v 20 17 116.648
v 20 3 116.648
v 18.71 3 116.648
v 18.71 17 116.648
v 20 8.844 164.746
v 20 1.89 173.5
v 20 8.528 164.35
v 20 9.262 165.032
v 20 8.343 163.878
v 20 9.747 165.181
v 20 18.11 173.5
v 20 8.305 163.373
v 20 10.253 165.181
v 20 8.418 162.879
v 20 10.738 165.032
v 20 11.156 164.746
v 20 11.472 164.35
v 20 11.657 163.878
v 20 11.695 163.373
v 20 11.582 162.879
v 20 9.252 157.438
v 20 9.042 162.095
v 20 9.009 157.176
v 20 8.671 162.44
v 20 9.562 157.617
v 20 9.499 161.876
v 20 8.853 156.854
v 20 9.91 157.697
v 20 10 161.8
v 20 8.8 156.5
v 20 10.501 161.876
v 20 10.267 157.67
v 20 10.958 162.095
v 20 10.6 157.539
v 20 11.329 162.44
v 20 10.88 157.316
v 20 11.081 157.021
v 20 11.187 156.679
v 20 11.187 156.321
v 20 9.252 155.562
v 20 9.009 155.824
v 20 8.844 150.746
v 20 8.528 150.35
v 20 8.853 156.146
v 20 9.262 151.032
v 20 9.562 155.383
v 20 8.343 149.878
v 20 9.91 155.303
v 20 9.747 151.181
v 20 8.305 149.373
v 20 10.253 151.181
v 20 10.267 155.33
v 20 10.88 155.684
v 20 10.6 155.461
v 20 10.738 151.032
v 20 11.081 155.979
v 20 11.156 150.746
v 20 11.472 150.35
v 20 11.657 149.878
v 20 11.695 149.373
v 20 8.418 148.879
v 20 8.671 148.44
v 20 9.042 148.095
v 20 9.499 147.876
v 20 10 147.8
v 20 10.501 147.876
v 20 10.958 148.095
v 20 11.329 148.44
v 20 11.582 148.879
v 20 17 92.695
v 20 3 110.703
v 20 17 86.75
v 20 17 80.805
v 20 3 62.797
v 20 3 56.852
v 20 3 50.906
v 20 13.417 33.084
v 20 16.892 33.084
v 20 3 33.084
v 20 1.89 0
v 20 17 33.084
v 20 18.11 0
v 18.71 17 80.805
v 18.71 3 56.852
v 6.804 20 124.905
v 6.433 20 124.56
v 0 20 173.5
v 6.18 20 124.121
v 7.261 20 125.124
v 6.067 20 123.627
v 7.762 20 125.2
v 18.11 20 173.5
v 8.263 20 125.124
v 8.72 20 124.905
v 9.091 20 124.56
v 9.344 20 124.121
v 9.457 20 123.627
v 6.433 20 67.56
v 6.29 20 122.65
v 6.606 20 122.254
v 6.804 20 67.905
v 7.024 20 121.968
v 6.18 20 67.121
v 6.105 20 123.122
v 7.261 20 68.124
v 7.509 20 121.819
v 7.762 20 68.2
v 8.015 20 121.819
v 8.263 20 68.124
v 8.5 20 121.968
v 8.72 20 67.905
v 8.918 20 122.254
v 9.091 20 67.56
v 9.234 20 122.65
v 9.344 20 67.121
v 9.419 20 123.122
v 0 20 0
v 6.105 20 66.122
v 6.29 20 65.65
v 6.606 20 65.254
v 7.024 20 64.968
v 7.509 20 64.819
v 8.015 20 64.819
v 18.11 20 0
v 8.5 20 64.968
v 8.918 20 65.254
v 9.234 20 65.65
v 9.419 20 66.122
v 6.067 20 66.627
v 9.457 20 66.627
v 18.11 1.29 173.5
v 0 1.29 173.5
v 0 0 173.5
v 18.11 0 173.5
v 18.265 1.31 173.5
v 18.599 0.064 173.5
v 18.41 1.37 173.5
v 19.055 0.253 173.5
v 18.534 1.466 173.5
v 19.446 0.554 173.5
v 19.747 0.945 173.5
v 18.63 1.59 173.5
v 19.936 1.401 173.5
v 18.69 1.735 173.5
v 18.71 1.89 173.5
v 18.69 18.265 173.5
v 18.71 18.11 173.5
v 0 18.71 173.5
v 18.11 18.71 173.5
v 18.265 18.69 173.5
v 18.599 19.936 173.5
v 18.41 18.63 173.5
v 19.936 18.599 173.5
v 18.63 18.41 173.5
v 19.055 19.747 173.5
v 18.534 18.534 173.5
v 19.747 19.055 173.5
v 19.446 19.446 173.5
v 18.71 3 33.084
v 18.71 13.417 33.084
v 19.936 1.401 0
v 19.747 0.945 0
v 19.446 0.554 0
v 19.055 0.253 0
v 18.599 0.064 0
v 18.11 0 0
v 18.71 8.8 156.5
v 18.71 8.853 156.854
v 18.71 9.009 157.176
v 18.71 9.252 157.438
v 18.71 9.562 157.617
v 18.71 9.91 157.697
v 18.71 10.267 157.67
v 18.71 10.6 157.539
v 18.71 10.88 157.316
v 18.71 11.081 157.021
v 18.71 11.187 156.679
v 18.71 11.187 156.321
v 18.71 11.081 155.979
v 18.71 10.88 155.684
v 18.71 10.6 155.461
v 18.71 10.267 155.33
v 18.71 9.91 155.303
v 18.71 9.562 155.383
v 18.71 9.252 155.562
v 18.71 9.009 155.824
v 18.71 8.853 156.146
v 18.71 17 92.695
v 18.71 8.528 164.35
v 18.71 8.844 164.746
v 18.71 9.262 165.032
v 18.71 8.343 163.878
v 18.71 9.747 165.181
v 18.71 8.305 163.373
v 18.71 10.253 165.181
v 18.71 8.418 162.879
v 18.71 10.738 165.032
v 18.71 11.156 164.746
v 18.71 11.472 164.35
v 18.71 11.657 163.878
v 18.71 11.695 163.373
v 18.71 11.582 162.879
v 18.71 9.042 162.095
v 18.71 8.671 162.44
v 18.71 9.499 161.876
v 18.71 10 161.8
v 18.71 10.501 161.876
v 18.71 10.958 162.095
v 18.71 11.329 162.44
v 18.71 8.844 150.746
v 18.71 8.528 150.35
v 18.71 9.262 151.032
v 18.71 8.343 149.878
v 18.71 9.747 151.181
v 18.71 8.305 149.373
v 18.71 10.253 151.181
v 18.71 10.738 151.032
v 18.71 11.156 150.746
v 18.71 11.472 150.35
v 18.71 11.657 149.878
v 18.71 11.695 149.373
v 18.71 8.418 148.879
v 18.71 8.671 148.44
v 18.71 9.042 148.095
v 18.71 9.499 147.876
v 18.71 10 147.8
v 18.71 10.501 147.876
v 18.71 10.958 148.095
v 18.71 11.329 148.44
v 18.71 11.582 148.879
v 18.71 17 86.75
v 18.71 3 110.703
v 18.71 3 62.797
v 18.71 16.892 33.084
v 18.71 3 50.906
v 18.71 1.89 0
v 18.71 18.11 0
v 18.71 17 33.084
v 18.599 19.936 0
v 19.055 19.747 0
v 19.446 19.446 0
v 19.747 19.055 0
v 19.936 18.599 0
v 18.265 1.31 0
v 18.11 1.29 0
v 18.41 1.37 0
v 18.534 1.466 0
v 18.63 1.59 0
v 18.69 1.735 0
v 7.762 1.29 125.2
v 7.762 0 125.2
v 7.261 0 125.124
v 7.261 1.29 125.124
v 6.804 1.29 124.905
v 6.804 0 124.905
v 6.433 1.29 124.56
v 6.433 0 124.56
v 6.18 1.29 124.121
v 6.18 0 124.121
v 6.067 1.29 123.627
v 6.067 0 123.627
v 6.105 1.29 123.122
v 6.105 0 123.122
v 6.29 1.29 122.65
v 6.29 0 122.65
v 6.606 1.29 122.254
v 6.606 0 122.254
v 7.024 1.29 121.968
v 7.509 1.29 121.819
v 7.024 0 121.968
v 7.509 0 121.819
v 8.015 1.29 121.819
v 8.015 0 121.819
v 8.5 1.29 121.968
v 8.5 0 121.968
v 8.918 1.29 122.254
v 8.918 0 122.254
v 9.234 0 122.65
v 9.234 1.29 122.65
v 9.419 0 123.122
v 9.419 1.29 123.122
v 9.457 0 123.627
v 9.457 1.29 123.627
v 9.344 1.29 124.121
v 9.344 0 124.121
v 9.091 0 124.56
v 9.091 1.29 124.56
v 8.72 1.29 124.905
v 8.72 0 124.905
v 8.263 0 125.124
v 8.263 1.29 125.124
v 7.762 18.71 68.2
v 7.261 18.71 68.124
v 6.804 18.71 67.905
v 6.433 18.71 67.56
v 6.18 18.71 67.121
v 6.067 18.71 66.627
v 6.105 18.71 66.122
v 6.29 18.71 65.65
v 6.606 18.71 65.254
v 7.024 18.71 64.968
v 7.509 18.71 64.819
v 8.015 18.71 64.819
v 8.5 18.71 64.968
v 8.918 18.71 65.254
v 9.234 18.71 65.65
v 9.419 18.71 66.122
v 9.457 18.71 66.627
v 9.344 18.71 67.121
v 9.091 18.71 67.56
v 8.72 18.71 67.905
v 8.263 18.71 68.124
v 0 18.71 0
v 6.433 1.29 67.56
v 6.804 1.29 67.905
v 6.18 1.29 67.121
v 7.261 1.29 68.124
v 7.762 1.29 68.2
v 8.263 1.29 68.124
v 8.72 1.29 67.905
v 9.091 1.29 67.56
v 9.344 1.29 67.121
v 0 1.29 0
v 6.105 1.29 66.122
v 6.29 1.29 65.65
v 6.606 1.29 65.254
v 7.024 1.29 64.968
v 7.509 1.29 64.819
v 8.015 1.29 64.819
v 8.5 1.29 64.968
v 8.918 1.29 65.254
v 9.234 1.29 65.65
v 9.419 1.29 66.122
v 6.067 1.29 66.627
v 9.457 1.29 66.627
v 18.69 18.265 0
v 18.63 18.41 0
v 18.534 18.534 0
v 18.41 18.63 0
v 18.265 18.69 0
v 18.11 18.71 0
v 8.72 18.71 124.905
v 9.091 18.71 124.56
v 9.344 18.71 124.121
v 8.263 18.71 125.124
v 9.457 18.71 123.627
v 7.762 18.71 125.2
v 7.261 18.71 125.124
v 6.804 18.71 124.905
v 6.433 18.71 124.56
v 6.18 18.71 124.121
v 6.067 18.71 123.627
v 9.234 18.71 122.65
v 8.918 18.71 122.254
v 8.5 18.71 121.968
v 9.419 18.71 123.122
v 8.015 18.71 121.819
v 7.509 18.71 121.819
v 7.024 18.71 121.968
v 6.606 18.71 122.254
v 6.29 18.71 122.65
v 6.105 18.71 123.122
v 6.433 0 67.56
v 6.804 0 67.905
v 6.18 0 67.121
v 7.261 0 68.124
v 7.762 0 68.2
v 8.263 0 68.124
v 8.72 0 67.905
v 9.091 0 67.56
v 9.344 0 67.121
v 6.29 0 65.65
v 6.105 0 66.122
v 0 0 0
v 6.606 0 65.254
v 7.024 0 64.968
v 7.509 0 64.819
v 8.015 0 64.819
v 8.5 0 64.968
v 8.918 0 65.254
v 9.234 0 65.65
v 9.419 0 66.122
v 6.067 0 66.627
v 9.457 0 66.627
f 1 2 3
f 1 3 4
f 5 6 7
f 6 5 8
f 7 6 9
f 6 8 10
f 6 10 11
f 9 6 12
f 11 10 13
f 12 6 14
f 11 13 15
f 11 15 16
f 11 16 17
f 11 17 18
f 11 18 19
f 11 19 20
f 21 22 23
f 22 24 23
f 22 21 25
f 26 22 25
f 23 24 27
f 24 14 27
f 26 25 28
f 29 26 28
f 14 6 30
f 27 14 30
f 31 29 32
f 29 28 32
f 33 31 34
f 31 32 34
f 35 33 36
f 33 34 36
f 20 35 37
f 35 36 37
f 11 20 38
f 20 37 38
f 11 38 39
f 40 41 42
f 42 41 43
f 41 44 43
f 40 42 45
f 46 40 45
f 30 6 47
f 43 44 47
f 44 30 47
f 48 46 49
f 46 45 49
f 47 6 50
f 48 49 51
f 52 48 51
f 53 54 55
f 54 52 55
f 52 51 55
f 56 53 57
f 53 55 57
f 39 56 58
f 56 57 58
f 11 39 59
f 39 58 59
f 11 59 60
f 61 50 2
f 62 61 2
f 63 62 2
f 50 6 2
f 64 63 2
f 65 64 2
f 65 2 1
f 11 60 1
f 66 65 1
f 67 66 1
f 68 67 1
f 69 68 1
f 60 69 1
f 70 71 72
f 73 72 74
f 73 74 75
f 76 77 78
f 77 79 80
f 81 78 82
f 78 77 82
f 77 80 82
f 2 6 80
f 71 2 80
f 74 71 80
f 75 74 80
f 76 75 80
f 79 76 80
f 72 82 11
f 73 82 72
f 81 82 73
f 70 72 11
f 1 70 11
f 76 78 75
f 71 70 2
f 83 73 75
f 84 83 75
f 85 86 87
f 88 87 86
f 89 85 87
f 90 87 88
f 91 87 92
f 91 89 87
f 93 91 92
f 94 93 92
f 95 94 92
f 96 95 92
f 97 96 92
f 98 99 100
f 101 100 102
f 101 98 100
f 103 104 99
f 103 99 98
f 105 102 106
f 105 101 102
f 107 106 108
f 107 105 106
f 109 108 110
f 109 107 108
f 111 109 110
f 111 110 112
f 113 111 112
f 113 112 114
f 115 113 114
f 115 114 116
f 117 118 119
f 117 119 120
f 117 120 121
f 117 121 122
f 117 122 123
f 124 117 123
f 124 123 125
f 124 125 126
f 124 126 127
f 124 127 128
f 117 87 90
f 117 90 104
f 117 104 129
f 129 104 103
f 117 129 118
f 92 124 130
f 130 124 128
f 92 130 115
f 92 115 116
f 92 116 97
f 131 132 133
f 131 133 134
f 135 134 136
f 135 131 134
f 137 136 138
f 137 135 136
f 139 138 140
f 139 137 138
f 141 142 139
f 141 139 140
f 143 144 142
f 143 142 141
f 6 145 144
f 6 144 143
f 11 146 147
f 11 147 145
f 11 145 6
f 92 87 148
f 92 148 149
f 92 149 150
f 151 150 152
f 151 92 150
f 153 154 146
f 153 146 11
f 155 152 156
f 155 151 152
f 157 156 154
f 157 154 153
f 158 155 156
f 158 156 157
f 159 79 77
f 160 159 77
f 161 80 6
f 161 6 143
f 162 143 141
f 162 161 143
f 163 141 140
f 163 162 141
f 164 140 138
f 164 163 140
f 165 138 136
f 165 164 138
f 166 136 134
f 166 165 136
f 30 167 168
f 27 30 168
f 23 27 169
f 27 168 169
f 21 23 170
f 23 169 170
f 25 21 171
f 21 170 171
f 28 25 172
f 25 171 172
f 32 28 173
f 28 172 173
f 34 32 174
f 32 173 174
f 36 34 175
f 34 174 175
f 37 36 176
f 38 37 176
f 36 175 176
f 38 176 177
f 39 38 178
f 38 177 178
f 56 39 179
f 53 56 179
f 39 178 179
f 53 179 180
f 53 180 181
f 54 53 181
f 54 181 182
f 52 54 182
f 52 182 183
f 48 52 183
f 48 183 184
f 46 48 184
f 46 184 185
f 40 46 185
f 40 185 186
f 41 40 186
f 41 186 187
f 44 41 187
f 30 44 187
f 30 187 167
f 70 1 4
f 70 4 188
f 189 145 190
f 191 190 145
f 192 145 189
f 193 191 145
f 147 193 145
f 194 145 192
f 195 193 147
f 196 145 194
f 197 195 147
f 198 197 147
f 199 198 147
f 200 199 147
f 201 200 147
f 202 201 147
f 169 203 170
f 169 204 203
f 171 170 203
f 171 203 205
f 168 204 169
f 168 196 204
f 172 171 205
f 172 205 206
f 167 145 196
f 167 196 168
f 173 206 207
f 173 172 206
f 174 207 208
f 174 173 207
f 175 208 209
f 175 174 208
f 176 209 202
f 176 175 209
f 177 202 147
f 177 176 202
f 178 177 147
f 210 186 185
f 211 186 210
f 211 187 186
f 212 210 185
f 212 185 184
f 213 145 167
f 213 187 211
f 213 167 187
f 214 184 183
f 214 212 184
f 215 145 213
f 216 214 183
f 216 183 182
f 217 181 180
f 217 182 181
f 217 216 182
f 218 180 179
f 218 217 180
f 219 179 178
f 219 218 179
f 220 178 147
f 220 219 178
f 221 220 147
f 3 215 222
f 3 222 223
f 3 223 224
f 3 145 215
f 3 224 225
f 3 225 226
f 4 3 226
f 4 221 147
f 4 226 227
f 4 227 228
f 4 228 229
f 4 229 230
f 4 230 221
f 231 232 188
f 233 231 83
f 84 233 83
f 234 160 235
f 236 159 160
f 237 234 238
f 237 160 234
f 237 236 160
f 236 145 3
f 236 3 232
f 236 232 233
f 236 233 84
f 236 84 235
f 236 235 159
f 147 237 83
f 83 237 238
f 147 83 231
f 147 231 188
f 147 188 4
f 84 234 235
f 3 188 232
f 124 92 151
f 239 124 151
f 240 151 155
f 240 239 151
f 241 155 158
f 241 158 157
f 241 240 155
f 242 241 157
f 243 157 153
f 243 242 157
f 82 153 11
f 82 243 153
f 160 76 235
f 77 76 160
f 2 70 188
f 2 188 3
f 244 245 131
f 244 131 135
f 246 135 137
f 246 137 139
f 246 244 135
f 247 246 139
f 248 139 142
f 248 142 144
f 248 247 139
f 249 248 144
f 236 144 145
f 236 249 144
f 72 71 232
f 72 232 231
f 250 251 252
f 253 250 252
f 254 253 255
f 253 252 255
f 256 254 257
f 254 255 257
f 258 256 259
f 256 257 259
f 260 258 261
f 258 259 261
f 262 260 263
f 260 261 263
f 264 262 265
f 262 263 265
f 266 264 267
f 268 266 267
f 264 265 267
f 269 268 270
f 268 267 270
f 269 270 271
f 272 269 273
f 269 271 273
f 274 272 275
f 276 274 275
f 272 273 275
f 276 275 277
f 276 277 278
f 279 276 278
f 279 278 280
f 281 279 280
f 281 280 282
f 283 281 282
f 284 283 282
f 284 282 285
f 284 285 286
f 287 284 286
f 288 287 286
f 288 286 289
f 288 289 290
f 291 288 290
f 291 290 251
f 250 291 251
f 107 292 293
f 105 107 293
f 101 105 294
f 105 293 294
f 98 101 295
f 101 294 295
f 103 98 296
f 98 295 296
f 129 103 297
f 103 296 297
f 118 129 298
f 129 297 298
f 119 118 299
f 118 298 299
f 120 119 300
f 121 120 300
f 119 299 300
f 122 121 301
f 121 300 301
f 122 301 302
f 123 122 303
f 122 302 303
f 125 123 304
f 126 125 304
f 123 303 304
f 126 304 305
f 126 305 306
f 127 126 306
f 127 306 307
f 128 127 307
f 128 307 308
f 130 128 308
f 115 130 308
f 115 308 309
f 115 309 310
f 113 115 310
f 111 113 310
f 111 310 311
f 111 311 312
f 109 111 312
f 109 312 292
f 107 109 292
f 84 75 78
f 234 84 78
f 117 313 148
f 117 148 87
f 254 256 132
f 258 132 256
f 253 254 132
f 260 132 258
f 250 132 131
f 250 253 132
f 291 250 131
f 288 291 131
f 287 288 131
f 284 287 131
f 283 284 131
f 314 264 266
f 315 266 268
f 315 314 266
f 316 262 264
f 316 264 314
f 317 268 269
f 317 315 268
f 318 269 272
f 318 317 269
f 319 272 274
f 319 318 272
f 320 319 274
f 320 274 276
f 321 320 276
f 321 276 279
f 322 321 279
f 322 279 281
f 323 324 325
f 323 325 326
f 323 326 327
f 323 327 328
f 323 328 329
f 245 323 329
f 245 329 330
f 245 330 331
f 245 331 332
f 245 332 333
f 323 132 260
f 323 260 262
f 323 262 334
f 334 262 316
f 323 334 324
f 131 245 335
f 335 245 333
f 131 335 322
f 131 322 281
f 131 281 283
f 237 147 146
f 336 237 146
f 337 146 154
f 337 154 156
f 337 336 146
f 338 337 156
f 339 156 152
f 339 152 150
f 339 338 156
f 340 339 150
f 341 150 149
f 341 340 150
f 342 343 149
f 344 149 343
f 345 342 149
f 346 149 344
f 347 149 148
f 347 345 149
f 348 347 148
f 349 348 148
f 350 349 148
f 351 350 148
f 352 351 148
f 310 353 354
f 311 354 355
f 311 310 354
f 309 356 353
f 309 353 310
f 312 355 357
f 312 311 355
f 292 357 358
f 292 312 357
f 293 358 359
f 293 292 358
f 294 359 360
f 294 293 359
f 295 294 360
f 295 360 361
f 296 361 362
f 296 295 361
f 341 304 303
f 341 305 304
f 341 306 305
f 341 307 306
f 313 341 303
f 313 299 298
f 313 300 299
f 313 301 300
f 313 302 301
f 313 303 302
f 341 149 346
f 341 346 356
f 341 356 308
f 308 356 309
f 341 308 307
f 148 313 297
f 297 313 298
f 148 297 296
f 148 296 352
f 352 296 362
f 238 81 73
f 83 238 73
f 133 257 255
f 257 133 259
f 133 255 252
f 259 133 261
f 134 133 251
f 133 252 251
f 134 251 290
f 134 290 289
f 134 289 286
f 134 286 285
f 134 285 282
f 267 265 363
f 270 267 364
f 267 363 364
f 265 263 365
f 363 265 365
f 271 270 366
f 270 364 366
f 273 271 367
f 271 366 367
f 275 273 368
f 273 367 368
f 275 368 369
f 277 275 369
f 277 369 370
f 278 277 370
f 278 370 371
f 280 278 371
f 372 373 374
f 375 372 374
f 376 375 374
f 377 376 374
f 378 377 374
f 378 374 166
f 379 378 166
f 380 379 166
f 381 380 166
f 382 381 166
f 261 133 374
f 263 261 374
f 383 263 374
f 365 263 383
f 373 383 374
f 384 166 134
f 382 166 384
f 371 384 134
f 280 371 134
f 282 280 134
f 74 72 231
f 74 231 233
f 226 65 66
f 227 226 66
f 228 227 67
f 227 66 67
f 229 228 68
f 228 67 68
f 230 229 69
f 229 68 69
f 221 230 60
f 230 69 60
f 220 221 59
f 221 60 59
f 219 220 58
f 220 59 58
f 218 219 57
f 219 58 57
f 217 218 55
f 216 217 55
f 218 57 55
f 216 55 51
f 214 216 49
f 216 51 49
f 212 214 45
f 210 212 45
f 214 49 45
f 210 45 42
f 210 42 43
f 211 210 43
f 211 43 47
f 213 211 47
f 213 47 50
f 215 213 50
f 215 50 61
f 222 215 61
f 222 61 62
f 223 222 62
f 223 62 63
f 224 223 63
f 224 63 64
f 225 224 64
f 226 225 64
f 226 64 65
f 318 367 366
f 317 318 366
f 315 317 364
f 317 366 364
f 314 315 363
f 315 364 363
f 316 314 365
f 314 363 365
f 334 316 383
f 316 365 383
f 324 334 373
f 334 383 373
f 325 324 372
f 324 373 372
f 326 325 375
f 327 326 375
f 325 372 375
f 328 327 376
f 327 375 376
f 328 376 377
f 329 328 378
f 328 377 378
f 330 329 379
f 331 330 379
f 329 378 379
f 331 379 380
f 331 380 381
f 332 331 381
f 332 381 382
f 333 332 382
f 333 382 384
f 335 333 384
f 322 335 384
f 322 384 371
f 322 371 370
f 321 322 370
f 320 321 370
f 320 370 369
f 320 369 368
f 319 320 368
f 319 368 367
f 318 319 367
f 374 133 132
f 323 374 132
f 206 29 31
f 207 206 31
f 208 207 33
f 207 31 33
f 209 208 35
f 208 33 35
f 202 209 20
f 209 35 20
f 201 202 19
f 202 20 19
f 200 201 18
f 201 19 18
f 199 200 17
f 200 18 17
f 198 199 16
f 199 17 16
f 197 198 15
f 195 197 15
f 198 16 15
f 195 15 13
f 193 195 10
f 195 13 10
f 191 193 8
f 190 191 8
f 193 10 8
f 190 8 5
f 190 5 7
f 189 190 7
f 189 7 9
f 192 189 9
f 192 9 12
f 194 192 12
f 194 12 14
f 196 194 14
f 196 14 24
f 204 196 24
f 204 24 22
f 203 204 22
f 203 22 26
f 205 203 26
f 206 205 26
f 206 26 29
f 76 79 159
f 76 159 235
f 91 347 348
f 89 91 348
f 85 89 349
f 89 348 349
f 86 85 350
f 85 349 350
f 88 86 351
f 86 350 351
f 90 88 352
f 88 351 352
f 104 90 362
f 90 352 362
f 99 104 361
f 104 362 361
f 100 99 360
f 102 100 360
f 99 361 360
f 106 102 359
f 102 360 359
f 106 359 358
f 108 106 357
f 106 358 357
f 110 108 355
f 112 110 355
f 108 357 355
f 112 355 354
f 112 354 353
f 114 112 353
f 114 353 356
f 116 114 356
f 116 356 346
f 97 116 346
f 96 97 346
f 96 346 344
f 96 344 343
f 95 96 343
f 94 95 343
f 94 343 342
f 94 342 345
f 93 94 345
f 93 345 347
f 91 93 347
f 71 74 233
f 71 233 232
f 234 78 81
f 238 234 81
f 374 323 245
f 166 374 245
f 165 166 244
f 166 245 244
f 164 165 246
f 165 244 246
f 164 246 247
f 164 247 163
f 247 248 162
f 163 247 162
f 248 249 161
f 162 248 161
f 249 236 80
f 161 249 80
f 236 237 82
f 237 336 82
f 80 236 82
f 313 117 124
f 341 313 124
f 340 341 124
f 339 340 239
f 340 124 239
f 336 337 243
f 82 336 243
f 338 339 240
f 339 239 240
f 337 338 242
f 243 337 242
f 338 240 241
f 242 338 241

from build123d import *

# Parameters (mm, degrees)
SKETCH1_W                = 20
SKETCH1_H                = 20
BOSS_EXTRUDE1_DEPTH      = 173.5
CONVERT_SOLID1_DEPTH     = 173.5
CUT_EXTRUDE2_DEPTH       = 10
SKETCH15_W               = 56.851586871
SKETCH15_H               = 15.11
BOSS_EXTRUDE2_DEPTH      = 1.29
M3_CLEARANCE_HOLE1_D     = 3.4
M3_CLEARANCE_HOLE1_DEPTH = 3.34
M3_CLEARANCE_HOLE1_TIP   = 1.021463052
SKETCH20_R               = 1.2
CUT_EXTRUDE5_DEPTH       = 5
M3_CLEARANCE_HOLE2_D     = 3.4
SKETCH35_W               = 33.08369384
SKETCH35_H               = 16.22
BOSS_EXTRUDE3_DEPTH      = 1.29


# Read off the part's stored shape, not the designer's step: Convert-Solid1
with BuildPart() as part:
    # Sketch1 → Boss-Extrude1 (new body)
    with BuildSketch(Plane.XY):
        with Locations((10, 10)):
            Rectangle(SKETCH1_W, SKETCH1_H)
    extrude(amount=BOSS_EXTRUDE1_DEPTH)

    # Convert-Solid1 outline → Convert-Solid1 (cut)
    with BuildSketch(Plane.XY):
        with BuildLine():
            Line((20, 0), (20, 1.89))
            ThreePointArc((20, 1.89), (19.446431816, 0.553568184), (18.11, 0))
            Line((18.11, 0), (20, 0))
        make_face()
        with BuildLine():
            ThreePointArc((18.11, 20), (19.446431816, 19.446431816), (20, 18.11))
            Line((20, 18.11), (20, 20))
            Line((20, 20), (18.11, 20))
        make_face()
        with BuildLine():
            Line((0, 18.71), (0, 1.29))
            Line((0, 1.29), (18.11, 1.29))
            ThreePointArc((18.11, 1.29), (18.534264069, 1.465735931), (18.71, 1.89))
            Line((18.71, 1.89), (18.71, 18.11))
            ThreePointArc((18.71, 18.11), (18.534264069, 18.534264069), (18.11, 18.71))
            Line((18.11, 18.71), (0, 18.71))
        make_face()
    extrude(amount=CONVERT_SOLID1_DEPTH, mode=Mode.SUBTRACT)

    # Sketch3 → Cut-Extrude2 (cut)
    with BuildSketch(Plane(origin=(20, 0, 0), x_dir=(0, 0, -1), z_dir=(1, 0, 0))):
        Polygon((-86.75, 17), (-62.796826259, 3), (-110.703173741, 3), align=None)
        Polygon((-80.804760612, 17), (-56.851586871, 3), (-32.898413129, 17), align=None)
        Polygon((-50.906347483, 3), (-26.953173741, 17), (-3, 3), align=None)
        Polygon((-21.007934353, 17), (-3, 6.474836042), (-3, 17), align=None)
        Polygon((-170.5, 17), (-152.492065647, 17), (-170.5, 6.474836042), align=None)
        Polygon((-170.5, 3), (-122.593652517, 3), (-146.546826259, 17), align=None)
        Polygon((-140.601586871, 17), (-92.695239388, 17), (-116.648413129, 3), align=None)
    extrude(amount=-CUT_EXTRUDE2_DEPTH, mode=Mode.SUBTRACT)

    # Sketch15 → Boss-Extrude2 (add)
    with BuildSketch(Plane(origin=(20, 0, 0), x_dir=(0, 0, -1), z_dir=(1, 0, 0))):
        with Locations((-145.074206565, 9.445)):
            Rectangle(SKETCH15_W, SKETCH15_H)
    extrude(amount=-BOSS_EXTRUDE2_DEPTH)

    # M3 Clearance Hole1
    with Locations(Plane.ZY.offset(-18.71)):
        with Locations((163.5, 10), (149.5, 10)):
            Hole(M3_CLEARANCE_HOLE1_D / 2, depth=M3_CLEARANCE_HOLE1_DEPTH)
            with Locations((0, 0, -(M3_CLEARANCE_HOLE1_DEPTH + M3_CLEARANCE_HOLE1_TIP / 2))):  # 118° drill point
                Cone(0, M3_CLEARANCE_HOLE1_D / 2, M3_CLEARANCE_HOLE1_TIP, mode=Mode.SUBTRACT)

    # Sketch20 → Cut-Extrude5 (cut)
    with BuildSketch(Plane.ZY.offset(-18.71)):
        with Locations(Location((156.5, 10, 0), (0, 0, 270))):
            Circle(SKETCH20_R)
    extrude(amount=-CUT_EXTRUDE5_DEPTH, mode=Mode.SUBTRACT)

    # M3 Clearance Hole2 (through all)
    with Locations(Plane(origin=(85.70162808, 20, 101.952320986), x_dir=(0, 0, -1), z_dir=(0, 1, 0))):
        with Locations((-21.547679014, 77.93962808), (35.452320986, 77.93962808)):
            Hole(M3_CLEARANCE_HOLE2_D / 2)

    # Sketch35 → Boss-Extrude3 (add)
    with BuildSketch(Plane(origin=(20, 0, 0), x_dir=(0, 0, -1), z_dir=(1, 0, 0))):
        with Locations((-16.54184692, 10)):
            Rectangle(SKETCH35_W, SKETCH35_H)
    extrude(amount=-BOSS_EXTRUDE3_DEPTH)


solid = part.part
